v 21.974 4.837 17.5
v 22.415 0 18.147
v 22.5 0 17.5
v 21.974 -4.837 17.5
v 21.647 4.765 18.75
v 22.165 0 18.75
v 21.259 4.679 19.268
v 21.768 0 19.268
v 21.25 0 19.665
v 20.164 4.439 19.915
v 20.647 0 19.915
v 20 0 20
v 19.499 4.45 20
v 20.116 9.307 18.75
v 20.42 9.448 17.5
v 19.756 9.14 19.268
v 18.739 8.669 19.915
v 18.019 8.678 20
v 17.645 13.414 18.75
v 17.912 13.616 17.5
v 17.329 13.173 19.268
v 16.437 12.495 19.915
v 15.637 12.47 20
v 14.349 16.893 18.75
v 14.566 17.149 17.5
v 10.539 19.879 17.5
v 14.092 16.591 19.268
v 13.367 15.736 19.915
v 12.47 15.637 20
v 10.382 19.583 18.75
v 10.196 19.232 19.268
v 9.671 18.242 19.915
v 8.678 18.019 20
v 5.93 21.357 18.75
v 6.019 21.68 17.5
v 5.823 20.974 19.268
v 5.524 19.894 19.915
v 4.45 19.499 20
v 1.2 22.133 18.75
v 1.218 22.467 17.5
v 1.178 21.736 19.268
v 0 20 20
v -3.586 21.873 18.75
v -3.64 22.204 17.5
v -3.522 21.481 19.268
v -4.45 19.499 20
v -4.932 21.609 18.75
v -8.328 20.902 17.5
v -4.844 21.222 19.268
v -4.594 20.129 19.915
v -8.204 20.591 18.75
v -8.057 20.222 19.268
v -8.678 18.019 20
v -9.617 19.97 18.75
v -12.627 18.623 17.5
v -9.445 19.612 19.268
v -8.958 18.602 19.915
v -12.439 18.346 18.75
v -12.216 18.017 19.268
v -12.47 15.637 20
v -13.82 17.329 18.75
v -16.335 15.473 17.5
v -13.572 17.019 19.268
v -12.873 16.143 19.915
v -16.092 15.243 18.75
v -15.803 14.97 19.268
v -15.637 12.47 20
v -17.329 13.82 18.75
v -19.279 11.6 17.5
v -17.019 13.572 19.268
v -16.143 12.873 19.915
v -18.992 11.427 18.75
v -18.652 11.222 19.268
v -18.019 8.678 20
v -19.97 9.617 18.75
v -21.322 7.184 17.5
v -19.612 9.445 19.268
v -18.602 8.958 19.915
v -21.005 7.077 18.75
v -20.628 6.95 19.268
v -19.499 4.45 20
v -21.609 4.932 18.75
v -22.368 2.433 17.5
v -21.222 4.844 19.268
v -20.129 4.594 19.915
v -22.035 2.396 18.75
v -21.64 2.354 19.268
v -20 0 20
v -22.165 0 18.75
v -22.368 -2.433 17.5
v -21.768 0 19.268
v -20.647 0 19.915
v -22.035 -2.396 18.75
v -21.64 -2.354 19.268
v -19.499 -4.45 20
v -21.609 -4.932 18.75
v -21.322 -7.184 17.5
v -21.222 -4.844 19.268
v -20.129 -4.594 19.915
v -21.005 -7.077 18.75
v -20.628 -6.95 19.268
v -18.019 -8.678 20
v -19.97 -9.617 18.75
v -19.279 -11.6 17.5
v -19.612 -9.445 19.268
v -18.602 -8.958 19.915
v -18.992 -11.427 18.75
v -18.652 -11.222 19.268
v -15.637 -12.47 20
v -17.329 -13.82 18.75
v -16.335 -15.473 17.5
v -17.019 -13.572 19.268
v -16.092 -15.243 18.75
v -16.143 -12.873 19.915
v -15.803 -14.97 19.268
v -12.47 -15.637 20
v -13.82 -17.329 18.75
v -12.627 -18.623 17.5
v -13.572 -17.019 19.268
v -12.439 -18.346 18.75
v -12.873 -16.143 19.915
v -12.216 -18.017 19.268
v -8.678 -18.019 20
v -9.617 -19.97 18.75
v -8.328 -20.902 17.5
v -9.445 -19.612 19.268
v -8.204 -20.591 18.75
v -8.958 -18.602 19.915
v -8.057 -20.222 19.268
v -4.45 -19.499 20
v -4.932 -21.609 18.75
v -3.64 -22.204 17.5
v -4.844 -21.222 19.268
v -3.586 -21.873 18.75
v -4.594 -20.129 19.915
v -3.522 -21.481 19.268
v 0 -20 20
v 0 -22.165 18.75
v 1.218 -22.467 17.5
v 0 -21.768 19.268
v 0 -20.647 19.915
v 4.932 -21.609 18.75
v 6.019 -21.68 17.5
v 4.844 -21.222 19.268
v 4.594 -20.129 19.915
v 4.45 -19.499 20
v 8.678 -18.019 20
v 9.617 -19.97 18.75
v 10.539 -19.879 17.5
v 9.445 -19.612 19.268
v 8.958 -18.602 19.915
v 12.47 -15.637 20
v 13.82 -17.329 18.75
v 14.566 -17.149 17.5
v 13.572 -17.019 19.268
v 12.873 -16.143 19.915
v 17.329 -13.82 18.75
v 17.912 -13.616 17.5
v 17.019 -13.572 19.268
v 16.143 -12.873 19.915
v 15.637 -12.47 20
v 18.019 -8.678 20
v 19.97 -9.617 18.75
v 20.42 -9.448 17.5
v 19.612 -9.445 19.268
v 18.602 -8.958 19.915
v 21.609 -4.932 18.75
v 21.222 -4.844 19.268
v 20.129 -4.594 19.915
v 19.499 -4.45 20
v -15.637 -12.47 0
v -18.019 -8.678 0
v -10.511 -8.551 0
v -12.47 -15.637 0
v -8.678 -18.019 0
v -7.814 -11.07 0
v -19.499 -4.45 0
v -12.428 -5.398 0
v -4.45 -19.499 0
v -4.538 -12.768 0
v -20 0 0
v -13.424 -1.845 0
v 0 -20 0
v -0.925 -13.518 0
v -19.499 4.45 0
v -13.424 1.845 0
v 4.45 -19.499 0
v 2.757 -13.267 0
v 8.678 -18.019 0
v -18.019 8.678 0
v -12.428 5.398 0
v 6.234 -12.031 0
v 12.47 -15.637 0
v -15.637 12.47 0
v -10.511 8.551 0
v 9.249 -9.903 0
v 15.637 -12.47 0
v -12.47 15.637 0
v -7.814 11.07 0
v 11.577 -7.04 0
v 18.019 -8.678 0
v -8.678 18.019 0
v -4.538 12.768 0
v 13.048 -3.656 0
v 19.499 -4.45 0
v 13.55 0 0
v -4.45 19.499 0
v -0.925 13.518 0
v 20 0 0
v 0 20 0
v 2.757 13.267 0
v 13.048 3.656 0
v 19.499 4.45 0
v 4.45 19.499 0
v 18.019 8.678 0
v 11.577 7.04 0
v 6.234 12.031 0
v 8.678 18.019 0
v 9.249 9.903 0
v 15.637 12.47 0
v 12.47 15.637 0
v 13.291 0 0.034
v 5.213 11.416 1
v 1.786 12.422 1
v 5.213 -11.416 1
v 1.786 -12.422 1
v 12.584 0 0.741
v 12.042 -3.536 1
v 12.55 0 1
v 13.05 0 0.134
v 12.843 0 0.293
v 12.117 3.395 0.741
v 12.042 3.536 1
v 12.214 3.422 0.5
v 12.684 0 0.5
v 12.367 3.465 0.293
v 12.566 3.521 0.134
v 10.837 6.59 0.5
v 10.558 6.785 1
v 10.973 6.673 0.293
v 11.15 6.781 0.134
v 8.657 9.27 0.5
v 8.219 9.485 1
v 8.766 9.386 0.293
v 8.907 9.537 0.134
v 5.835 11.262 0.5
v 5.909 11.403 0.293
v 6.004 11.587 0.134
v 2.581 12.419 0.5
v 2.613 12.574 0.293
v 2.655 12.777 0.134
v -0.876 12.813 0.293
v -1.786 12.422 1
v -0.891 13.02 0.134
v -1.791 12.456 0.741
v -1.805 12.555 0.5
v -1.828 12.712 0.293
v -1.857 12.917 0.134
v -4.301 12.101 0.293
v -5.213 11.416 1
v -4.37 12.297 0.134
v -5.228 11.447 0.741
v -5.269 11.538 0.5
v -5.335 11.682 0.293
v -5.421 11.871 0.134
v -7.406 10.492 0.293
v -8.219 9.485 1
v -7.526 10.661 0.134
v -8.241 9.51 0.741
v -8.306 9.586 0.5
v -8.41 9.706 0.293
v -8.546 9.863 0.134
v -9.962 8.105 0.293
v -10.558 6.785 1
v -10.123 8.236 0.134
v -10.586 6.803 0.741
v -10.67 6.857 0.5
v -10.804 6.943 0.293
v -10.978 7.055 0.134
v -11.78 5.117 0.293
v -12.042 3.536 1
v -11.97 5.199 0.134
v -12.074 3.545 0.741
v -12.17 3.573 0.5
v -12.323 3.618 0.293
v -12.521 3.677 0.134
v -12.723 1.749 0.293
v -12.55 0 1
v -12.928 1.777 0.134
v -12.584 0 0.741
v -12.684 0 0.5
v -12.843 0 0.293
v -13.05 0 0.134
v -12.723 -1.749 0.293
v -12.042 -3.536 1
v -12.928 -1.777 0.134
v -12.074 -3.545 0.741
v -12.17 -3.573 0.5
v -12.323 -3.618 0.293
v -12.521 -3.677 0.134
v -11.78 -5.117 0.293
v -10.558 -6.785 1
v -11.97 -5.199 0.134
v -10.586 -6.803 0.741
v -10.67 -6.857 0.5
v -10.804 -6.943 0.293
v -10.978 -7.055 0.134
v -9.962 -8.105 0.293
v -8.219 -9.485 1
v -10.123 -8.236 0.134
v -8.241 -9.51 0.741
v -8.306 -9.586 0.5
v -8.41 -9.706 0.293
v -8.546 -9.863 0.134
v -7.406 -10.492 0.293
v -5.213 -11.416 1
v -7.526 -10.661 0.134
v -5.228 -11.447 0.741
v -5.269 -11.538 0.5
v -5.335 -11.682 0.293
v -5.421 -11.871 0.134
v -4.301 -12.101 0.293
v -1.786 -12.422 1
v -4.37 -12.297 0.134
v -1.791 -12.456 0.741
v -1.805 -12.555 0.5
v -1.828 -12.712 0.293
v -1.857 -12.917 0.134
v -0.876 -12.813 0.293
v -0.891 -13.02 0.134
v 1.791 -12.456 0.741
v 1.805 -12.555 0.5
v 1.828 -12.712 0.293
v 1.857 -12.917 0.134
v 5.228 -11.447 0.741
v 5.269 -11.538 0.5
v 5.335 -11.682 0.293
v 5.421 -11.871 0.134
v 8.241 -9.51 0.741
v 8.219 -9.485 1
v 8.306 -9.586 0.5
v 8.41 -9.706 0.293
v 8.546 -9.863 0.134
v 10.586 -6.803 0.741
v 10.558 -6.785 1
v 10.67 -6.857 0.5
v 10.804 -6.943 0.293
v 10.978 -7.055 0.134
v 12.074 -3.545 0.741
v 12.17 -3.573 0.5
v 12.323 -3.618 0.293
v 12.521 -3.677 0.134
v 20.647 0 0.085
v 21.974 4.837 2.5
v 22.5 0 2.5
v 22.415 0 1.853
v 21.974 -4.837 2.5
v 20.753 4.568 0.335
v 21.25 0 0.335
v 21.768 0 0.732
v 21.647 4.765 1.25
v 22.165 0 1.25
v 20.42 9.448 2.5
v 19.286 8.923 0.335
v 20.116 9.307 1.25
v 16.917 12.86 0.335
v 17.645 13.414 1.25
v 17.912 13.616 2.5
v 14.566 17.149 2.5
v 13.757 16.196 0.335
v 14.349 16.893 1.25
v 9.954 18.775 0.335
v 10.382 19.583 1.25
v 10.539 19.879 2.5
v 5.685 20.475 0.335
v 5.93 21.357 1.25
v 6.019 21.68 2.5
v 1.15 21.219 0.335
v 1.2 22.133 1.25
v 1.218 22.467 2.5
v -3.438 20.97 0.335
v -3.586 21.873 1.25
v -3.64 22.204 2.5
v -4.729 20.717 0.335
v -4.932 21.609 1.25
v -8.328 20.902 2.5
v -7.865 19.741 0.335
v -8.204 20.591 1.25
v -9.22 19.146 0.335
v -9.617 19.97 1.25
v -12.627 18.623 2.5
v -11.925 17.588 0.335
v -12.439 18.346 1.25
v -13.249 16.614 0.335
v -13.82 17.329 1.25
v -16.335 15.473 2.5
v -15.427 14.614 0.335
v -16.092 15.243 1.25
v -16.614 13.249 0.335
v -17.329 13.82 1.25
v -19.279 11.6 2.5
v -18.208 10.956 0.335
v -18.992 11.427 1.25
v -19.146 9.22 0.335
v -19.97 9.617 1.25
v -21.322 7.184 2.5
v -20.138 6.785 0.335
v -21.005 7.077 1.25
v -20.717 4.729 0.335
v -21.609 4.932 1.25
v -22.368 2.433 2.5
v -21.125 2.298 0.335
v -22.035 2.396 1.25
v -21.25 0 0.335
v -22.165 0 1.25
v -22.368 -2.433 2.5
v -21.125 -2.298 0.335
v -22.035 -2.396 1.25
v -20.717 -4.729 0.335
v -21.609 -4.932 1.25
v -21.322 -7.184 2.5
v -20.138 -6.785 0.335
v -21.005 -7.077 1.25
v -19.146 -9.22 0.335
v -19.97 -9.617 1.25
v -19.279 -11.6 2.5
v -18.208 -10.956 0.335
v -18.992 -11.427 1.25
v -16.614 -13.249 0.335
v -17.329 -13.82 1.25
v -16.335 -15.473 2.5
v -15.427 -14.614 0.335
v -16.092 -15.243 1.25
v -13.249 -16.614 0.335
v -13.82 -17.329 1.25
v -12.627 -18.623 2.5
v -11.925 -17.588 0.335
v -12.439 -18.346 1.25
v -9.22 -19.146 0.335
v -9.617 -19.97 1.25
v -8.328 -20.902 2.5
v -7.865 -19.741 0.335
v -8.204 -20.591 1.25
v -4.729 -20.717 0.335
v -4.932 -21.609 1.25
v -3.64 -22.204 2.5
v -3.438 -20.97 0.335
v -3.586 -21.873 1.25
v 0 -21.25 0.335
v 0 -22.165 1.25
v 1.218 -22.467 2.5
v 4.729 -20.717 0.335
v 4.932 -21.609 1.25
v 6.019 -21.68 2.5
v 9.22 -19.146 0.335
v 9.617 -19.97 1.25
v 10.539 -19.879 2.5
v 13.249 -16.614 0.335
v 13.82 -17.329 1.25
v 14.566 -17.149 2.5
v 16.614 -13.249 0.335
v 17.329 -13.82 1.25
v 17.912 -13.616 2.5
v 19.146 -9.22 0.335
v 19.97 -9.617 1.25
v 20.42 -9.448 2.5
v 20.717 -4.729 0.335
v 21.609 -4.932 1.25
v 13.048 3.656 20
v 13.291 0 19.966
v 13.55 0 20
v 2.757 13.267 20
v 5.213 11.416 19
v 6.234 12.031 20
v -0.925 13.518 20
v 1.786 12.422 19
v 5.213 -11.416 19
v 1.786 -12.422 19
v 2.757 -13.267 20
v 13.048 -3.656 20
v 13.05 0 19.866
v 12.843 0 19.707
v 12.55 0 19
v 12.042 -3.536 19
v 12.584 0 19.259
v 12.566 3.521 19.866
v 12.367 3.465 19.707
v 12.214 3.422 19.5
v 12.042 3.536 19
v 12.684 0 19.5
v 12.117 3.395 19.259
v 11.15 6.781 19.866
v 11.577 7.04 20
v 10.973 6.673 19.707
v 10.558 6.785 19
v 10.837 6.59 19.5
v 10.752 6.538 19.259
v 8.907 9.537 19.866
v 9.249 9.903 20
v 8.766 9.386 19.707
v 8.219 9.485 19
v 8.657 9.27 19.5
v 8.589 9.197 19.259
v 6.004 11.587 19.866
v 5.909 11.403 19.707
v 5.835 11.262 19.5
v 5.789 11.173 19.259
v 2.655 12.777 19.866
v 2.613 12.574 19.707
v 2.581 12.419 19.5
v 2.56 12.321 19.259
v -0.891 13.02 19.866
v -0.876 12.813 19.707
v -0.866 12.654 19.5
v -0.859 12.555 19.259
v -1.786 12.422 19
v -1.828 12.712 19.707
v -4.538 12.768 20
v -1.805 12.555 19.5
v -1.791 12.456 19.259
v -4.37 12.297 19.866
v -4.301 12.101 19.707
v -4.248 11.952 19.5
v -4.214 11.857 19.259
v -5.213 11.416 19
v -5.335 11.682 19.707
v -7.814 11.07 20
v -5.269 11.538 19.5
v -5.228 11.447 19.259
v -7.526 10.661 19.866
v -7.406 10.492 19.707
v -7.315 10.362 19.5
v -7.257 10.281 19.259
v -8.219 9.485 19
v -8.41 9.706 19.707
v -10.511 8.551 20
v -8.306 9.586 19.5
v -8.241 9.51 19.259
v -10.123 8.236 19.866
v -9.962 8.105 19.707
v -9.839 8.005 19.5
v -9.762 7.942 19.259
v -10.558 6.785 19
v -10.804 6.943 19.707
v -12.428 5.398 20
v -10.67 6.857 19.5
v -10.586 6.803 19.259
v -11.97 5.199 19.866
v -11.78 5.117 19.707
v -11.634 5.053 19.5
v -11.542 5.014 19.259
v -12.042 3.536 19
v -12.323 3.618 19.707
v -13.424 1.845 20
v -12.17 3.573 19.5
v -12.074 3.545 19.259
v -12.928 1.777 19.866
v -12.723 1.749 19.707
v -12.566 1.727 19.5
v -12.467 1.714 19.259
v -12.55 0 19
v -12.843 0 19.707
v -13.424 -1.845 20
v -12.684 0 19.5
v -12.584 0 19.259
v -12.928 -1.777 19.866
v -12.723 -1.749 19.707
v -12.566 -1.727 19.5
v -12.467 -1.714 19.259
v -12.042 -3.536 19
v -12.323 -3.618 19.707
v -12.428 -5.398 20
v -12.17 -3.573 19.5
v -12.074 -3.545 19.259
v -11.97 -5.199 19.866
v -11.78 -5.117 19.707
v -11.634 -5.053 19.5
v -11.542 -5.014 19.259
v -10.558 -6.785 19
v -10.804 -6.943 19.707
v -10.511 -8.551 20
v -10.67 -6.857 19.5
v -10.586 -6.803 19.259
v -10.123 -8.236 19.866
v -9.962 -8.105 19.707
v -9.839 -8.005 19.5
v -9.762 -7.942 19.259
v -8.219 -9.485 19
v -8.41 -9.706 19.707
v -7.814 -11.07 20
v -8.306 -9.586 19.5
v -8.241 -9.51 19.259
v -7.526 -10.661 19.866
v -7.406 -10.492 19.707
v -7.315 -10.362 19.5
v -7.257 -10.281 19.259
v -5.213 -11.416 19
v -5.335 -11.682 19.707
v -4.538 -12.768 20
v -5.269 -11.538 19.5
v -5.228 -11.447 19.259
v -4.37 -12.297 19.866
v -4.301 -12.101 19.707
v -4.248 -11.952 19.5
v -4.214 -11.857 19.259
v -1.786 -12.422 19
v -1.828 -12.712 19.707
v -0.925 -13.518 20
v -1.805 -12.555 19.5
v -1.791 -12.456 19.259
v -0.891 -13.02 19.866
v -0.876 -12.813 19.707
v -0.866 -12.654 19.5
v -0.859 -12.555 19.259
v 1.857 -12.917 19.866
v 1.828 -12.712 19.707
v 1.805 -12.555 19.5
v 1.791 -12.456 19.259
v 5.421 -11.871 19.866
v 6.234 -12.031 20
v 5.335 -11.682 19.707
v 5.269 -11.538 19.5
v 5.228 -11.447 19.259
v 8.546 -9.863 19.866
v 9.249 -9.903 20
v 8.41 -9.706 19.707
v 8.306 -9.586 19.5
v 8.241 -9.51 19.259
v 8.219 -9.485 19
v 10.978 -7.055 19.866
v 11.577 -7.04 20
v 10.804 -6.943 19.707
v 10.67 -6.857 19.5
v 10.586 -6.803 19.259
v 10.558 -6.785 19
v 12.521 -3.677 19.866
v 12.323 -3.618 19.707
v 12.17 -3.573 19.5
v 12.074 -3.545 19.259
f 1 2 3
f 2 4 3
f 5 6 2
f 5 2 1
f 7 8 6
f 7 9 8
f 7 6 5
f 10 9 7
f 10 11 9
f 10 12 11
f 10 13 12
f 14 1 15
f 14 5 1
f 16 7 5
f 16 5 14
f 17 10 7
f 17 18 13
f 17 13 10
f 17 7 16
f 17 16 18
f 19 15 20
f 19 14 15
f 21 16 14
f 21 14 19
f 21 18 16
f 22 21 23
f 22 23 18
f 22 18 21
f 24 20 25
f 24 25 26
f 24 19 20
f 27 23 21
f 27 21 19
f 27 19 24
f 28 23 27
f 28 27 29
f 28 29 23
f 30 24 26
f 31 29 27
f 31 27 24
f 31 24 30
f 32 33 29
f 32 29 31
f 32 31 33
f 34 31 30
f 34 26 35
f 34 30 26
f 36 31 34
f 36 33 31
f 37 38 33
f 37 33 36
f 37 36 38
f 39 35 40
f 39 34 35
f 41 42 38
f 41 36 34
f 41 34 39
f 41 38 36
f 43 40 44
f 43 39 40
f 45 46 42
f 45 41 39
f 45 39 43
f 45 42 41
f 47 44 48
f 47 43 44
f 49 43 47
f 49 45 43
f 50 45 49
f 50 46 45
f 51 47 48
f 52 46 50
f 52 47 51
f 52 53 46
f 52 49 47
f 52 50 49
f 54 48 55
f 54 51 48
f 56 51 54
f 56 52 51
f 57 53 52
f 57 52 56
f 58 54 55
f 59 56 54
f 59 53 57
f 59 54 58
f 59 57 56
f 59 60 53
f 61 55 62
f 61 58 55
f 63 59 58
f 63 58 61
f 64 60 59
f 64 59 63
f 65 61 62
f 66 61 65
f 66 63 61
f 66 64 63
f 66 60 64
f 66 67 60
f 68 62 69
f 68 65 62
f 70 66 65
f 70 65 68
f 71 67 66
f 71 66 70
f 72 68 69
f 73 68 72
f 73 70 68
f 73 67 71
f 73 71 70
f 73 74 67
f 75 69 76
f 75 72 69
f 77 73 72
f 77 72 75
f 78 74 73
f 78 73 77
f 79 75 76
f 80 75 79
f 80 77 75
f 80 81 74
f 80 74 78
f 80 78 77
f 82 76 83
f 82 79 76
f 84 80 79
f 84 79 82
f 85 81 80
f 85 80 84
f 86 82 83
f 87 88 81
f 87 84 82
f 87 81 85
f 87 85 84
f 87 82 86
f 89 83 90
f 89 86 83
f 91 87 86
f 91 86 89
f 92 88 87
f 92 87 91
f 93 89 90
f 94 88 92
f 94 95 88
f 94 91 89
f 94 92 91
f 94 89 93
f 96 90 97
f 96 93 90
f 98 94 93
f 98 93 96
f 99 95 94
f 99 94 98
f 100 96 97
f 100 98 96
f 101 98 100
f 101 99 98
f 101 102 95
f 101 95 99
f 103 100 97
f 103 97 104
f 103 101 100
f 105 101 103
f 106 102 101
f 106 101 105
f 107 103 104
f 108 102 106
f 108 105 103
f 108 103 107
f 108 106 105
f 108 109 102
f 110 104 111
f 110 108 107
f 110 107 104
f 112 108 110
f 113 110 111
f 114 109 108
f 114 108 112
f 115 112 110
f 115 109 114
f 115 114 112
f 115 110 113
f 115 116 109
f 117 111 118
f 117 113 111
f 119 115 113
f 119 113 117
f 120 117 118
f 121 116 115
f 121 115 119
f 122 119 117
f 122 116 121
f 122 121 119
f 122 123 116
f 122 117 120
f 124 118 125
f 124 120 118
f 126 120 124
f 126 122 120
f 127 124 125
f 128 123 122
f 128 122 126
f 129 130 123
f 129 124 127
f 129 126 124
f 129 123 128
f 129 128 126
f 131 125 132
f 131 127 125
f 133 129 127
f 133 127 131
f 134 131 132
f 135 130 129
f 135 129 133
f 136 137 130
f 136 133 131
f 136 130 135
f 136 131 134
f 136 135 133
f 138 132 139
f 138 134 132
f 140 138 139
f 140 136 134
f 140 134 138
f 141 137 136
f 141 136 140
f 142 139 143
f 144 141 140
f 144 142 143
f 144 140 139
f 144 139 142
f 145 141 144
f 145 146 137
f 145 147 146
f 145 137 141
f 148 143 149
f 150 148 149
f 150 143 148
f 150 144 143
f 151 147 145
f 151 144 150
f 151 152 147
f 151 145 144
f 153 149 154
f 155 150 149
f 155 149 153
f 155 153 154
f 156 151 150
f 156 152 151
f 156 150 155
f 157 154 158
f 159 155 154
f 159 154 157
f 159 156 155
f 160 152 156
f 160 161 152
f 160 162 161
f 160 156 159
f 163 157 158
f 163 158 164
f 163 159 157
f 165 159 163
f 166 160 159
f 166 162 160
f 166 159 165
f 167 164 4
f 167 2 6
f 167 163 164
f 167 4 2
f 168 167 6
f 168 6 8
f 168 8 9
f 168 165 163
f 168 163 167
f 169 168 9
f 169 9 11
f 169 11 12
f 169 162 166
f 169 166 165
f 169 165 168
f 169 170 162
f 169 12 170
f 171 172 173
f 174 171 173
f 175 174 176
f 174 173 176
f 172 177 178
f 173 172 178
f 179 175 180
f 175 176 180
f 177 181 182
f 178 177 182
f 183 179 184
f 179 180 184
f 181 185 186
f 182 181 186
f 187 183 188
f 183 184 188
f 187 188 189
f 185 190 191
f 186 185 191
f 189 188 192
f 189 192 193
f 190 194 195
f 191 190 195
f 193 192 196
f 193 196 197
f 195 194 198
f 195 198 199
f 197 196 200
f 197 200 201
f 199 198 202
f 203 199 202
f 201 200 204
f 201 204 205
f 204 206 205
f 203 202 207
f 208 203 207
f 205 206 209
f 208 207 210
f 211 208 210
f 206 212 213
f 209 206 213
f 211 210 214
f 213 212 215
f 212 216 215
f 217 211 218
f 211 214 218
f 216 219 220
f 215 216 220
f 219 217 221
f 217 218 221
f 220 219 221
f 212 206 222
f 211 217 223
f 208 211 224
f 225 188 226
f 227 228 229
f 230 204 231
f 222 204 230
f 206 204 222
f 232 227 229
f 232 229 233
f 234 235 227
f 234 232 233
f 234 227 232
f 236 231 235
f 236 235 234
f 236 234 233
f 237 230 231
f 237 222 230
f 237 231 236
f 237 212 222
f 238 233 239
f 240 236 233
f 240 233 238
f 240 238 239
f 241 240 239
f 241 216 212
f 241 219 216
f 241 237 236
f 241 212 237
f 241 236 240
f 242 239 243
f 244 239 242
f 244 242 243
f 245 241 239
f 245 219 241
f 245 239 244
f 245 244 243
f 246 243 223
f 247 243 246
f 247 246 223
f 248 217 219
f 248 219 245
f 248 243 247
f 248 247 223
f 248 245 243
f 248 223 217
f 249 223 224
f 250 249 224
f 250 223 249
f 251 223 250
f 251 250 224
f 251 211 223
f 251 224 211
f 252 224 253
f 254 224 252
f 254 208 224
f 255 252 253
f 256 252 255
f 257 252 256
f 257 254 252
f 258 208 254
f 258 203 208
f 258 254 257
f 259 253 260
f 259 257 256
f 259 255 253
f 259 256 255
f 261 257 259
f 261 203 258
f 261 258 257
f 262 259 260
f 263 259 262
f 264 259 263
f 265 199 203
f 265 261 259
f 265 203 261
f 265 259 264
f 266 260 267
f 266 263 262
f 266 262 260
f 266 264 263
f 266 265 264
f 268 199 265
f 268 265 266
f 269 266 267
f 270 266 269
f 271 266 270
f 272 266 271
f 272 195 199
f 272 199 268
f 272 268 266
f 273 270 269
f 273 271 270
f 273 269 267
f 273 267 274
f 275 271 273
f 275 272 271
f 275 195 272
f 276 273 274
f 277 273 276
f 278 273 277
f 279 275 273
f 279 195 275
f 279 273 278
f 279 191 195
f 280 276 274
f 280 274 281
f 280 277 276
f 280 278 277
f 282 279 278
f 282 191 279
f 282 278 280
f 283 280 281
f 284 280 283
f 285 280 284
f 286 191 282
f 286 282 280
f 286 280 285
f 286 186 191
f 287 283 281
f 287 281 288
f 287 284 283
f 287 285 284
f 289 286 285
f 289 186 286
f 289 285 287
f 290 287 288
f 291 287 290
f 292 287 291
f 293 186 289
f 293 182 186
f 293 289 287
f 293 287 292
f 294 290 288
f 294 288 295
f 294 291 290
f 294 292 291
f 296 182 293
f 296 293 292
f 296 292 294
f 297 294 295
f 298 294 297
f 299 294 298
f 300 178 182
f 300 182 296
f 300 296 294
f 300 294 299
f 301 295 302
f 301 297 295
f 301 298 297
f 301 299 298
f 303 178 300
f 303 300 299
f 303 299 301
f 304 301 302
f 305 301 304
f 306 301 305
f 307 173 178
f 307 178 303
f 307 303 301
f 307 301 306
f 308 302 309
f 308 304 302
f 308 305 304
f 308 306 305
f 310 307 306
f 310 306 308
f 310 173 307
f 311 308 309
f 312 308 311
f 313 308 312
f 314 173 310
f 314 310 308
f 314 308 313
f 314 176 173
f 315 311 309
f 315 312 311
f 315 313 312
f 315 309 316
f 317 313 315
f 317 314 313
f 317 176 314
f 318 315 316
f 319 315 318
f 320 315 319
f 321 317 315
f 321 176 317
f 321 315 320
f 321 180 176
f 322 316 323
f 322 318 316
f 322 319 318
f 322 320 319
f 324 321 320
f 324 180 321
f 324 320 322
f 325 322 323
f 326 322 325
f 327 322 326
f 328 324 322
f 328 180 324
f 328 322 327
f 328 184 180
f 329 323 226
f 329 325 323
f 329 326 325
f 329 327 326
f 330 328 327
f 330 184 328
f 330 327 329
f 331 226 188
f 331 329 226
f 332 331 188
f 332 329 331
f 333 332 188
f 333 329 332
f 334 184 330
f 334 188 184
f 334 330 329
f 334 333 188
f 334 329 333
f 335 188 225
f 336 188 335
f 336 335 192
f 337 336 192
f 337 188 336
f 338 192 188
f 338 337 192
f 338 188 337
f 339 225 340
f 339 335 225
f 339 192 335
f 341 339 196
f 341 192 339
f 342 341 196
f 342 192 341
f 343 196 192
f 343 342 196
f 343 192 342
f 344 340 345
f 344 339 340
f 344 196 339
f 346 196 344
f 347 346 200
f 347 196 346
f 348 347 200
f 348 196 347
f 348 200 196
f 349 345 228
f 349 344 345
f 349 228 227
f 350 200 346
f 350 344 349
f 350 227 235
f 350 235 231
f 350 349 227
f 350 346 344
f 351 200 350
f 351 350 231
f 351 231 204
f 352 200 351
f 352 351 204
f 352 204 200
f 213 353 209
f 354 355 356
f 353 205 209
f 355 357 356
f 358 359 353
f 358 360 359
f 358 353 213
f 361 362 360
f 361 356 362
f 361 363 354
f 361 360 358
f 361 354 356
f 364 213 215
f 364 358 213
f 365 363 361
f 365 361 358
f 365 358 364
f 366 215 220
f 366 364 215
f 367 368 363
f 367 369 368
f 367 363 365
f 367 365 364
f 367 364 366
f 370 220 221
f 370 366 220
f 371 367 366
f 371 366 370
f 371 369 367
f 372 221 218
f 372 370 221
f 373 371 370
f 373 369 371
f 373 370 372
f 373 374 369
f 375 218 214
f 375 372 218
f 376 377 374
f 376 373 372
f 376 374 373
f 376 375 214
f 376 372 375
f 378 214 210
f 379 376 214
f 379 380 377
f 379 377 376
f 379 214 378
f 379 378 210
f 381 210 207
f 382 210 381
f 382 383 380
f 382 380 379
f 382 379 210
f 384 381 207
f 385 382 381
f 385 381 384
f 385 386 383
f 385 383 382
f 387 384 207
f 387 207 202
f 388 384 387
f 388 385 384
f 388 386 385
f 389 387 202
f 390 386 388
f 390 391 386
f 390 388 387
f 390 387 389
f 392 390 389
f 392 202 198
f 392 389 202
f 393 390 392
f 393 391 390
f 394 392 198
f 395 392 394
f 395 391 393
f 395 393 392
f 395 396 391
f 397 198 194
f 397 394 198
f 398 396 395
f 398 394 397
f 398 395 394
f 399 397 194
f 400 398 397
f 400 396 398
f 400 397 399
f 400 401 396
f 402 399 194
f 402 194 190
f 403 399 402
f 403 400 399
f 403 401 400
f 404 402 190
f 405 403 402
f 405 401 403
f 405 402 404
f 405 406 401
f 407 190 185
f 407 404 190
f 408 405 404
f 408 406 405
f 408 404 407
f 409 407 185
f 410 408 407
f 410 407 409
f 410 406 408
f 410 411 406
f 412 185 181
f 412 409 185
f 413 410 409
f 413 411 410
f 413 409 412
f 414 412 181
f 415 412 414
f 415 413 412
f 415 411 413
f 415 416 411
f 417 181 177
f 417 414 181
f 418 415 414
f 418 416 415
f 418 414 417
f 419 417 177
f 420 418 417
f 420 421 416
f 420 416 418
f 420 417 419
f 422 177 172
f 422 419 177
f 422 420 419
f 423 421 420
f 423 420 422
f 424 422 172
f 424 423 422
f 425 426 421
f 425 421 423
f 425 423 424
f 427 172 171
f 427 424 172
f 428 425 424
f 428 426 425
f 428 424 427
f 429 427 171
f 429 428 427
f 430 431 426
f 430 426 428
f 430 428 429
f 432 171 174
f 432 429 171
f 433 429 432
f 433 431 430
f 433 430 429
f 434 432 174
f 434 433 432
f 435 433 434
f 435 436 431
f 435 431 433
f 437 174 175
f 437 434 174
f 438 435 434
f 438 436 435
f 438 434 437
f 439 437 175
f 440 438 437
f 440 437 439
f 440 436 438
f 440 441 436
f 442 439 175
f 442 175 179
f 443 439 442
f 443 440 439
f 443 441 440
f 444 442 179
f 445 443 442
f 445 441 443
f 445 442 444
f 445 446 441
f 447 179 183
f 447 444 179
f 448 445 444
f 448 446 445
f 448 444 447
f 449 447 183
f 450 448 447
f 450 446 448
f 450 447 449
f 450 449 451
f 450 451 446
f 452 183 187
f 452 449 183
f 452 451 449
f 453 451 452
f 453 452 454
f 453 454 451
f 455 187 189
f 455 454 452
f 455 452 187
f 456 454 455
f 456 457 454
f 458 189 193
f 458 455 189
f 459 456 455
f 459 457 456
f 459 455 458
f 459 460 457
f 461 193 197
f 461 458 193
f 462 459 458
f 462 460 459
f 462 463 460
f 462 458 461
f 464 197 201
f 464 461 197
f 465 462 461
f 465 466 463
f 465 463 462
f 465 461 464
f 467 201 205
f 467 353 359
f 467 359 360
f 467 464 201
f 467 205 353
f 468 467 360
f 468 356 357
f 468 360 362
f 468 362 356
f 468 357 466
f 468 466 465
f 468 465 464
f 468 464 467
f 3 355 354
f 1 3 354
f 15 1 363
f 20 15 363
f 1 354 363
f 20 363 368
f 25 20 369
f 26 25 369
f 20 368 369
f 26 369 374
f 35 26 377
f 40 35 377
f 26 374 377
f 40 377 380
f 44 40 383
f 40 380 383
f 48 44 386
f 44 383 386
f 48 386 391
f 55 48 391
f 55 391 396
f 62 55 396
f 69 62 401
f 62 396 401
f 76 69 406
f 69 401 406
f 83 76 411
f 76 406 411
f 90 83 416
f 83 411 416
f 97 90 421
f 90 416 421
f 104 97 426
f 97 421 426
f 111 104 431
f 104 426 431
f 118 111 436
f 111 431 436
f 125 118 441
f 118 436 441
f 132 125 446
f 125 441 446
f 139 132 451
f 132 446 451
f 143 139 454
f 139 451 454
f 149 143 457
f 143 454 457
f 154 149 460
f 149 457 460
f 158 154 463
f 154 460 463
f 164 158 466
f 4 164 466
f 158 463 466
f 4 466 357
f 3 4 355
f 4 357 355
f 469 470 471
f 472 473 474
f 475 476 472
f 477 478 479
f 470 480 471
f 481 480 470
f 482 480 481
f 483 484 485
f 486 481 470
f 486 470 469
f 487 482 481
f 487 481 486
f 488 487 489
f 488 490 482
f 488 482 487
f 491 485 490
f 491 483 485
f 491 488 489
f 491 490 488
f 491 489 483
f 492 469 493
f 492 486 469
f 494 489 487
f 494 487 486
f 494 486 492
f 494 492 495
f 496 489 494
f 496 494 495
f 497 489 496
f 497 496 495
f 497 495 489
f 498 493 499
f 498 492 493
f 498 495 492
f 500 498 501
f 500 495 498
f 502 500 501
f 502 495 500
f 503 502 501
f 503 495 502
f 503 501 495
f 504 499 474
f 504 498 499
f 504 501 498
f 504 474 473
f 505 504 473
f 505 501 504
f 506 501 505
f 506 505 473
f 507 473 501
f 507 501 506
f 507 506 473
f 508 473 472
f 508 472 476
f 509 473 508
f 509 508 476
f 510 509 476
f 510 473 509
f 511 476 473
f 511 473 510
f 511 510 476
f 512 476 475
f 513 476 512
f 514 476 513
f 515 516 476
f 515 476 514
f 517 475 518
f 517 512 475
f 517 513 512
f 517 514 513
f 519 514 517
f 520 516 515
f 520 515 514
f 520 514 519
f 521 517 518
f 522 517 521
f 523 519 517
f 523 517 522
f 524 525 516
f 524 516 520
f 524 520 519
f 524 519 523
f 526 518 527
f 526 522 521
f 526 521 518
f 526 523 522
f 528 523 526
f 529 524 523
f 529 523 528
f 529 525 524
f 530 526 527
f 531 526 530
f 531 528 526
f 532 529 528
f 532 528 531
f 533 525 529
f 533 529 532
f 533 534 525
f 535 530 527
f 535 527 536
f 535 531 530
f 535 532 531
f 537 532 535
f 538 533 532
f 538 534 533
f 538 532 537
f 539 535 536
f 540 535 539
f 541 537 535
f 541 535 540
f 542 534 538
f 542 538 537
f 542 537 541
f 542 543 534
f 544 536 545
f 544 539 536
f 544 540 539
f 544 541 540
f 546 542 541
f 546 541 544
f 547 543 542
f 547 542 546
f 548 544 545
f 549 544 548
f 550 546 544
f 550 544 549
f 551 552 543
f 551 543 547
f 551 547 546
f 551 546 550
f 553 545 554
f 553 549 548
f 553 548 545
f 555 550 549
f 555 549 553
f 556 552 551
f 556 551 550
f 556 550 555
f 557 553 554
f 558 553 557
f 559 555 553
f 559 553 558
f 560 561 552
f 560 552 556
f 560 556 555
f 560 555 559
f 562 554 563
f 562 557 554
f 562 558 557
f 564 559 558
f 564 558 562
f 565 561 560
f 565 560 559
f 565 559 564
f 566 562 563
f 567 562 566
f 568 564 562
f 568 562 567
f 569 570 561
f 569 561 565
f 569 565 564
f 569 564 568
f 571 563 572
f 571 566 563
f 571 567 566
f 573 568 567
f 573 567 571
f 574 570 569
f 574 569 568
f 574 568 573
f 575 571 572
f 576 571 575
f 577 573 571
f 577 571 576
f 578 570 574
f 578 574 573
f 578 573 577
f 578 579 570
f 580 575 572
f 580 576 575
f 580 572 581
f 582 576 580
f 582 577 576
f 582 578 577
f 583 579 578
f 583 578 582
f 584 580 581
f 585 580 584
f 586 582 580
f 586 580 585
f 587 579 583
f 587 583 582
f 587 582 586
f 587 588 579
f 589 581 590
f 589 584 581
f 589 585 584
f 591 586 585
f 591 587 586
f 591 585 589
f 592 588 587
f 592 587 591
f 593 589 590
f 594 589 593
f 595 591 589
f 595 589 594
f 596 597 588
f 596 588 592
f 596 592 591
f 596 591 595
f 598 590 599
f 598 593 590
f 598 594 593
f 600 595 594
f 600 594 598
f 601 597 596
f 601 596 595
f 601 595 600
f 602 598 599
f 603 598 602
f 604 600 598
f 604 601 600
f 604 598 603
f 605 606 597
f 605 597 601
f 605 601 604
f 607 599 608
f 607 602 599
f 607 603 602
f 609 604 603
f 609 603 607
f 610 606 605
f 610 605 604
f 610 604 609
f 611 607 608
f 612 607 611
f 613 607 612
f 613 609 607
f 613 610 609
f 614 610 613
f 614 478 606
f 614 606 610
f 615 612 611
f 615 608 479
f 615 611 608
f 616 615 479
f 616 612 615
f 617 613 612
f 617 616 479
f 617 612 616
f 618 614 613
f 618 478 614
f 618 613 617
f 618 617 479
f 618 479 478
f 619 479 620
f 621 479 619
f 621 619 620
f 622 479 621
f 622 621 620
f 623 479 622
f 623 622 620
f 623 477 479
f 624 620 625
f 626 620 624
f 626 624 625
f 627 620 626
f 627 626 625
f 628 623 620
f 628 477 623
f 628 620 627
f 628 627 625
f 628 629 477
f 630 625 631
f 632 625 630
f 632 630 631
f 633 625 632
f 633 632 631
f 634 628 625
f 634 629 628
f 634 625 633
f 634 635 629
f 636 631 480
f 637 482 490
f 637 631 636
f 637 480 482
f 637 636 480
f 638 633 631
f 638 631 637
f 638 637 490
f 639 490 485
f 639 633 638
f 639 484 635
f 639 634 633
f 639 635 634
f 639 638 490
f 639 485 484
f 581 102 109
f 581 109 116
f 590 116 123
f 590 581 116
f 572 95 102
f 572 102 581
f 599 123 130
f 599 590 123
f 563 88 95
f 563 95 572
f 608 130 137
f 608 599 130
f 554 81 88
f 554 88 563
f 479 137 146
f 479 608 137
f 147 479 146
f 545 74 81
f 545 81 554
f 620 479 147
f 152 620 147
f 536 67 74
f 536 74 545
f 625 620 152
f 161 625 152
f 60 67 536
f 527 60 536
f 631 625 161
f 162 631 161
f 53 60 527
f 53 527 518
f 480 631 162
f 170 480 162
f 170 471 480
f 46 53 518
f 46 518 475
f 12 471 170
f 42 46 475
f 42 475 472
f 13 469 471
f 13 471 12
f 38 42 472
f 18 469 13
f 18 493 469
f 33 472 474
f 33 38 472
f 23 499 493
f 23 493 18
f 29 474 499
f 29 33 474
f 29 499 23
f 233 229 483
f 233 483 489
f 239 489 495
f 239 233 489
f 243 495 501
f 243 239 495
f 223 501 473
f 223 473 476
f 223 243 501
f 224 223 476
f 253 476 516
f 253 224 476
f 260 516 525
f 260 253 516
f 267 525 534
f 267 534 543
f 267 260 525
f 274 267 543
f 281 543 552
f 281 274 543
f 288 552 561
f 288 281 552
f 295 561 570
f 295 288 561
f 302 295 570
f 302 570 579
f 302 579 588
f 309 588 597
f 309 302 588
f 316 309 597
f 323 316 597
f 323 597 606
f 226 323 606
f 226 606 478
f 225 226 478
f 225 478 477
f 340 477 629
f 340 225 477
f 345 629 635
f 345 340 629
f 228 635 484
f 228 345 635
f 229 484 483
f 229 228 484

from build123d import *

# Parameters (mm, degrees)
F0_R     = 22.5
F0_R_2   = 12.55
F1_DEPTH = 20
F2_R     = 2.5
F3_R     = 1
F4_R     = 1
F5_R     = 2.5


with BuildPart() as f1:
    # F0 (on Top) → F1 (new body)
    with BuildSketch(Plane.XY):
        Circle(F0_R)
        Circle(F0_R_2, mode=Mode.SUBTRACT)
    extrude(amount=F1_DEPTH)

    # F2
    f2_edges = [f1.edges().sort_by_distance(p)[0] for p in [
        (-22.5, 0, 20),
    ]]
    fillet(f2_edges, radius=F2_R)

    # F3
    f3_edges = [f1.edges().sort_by_distance(p)[0] for p in [
        (-12.55, 0, 20),
    ]]
    fillet(f3_edges, radius=F3_R)

    # F4
    f4_edges = [f1.edges().sort_by_distance(p)[0] for p in [
        (-12.55, 0, 0),
    ]]
    fillet(f4_edges, radius=F4_R)

    # F5
    f5_edges = [f1.edges().sort_by_distance(p)[0] for p in [
        (-22.5, 0, 0),
    ]]
    fillet(f5_edges, radius=F5_R)


solid = f1.part
